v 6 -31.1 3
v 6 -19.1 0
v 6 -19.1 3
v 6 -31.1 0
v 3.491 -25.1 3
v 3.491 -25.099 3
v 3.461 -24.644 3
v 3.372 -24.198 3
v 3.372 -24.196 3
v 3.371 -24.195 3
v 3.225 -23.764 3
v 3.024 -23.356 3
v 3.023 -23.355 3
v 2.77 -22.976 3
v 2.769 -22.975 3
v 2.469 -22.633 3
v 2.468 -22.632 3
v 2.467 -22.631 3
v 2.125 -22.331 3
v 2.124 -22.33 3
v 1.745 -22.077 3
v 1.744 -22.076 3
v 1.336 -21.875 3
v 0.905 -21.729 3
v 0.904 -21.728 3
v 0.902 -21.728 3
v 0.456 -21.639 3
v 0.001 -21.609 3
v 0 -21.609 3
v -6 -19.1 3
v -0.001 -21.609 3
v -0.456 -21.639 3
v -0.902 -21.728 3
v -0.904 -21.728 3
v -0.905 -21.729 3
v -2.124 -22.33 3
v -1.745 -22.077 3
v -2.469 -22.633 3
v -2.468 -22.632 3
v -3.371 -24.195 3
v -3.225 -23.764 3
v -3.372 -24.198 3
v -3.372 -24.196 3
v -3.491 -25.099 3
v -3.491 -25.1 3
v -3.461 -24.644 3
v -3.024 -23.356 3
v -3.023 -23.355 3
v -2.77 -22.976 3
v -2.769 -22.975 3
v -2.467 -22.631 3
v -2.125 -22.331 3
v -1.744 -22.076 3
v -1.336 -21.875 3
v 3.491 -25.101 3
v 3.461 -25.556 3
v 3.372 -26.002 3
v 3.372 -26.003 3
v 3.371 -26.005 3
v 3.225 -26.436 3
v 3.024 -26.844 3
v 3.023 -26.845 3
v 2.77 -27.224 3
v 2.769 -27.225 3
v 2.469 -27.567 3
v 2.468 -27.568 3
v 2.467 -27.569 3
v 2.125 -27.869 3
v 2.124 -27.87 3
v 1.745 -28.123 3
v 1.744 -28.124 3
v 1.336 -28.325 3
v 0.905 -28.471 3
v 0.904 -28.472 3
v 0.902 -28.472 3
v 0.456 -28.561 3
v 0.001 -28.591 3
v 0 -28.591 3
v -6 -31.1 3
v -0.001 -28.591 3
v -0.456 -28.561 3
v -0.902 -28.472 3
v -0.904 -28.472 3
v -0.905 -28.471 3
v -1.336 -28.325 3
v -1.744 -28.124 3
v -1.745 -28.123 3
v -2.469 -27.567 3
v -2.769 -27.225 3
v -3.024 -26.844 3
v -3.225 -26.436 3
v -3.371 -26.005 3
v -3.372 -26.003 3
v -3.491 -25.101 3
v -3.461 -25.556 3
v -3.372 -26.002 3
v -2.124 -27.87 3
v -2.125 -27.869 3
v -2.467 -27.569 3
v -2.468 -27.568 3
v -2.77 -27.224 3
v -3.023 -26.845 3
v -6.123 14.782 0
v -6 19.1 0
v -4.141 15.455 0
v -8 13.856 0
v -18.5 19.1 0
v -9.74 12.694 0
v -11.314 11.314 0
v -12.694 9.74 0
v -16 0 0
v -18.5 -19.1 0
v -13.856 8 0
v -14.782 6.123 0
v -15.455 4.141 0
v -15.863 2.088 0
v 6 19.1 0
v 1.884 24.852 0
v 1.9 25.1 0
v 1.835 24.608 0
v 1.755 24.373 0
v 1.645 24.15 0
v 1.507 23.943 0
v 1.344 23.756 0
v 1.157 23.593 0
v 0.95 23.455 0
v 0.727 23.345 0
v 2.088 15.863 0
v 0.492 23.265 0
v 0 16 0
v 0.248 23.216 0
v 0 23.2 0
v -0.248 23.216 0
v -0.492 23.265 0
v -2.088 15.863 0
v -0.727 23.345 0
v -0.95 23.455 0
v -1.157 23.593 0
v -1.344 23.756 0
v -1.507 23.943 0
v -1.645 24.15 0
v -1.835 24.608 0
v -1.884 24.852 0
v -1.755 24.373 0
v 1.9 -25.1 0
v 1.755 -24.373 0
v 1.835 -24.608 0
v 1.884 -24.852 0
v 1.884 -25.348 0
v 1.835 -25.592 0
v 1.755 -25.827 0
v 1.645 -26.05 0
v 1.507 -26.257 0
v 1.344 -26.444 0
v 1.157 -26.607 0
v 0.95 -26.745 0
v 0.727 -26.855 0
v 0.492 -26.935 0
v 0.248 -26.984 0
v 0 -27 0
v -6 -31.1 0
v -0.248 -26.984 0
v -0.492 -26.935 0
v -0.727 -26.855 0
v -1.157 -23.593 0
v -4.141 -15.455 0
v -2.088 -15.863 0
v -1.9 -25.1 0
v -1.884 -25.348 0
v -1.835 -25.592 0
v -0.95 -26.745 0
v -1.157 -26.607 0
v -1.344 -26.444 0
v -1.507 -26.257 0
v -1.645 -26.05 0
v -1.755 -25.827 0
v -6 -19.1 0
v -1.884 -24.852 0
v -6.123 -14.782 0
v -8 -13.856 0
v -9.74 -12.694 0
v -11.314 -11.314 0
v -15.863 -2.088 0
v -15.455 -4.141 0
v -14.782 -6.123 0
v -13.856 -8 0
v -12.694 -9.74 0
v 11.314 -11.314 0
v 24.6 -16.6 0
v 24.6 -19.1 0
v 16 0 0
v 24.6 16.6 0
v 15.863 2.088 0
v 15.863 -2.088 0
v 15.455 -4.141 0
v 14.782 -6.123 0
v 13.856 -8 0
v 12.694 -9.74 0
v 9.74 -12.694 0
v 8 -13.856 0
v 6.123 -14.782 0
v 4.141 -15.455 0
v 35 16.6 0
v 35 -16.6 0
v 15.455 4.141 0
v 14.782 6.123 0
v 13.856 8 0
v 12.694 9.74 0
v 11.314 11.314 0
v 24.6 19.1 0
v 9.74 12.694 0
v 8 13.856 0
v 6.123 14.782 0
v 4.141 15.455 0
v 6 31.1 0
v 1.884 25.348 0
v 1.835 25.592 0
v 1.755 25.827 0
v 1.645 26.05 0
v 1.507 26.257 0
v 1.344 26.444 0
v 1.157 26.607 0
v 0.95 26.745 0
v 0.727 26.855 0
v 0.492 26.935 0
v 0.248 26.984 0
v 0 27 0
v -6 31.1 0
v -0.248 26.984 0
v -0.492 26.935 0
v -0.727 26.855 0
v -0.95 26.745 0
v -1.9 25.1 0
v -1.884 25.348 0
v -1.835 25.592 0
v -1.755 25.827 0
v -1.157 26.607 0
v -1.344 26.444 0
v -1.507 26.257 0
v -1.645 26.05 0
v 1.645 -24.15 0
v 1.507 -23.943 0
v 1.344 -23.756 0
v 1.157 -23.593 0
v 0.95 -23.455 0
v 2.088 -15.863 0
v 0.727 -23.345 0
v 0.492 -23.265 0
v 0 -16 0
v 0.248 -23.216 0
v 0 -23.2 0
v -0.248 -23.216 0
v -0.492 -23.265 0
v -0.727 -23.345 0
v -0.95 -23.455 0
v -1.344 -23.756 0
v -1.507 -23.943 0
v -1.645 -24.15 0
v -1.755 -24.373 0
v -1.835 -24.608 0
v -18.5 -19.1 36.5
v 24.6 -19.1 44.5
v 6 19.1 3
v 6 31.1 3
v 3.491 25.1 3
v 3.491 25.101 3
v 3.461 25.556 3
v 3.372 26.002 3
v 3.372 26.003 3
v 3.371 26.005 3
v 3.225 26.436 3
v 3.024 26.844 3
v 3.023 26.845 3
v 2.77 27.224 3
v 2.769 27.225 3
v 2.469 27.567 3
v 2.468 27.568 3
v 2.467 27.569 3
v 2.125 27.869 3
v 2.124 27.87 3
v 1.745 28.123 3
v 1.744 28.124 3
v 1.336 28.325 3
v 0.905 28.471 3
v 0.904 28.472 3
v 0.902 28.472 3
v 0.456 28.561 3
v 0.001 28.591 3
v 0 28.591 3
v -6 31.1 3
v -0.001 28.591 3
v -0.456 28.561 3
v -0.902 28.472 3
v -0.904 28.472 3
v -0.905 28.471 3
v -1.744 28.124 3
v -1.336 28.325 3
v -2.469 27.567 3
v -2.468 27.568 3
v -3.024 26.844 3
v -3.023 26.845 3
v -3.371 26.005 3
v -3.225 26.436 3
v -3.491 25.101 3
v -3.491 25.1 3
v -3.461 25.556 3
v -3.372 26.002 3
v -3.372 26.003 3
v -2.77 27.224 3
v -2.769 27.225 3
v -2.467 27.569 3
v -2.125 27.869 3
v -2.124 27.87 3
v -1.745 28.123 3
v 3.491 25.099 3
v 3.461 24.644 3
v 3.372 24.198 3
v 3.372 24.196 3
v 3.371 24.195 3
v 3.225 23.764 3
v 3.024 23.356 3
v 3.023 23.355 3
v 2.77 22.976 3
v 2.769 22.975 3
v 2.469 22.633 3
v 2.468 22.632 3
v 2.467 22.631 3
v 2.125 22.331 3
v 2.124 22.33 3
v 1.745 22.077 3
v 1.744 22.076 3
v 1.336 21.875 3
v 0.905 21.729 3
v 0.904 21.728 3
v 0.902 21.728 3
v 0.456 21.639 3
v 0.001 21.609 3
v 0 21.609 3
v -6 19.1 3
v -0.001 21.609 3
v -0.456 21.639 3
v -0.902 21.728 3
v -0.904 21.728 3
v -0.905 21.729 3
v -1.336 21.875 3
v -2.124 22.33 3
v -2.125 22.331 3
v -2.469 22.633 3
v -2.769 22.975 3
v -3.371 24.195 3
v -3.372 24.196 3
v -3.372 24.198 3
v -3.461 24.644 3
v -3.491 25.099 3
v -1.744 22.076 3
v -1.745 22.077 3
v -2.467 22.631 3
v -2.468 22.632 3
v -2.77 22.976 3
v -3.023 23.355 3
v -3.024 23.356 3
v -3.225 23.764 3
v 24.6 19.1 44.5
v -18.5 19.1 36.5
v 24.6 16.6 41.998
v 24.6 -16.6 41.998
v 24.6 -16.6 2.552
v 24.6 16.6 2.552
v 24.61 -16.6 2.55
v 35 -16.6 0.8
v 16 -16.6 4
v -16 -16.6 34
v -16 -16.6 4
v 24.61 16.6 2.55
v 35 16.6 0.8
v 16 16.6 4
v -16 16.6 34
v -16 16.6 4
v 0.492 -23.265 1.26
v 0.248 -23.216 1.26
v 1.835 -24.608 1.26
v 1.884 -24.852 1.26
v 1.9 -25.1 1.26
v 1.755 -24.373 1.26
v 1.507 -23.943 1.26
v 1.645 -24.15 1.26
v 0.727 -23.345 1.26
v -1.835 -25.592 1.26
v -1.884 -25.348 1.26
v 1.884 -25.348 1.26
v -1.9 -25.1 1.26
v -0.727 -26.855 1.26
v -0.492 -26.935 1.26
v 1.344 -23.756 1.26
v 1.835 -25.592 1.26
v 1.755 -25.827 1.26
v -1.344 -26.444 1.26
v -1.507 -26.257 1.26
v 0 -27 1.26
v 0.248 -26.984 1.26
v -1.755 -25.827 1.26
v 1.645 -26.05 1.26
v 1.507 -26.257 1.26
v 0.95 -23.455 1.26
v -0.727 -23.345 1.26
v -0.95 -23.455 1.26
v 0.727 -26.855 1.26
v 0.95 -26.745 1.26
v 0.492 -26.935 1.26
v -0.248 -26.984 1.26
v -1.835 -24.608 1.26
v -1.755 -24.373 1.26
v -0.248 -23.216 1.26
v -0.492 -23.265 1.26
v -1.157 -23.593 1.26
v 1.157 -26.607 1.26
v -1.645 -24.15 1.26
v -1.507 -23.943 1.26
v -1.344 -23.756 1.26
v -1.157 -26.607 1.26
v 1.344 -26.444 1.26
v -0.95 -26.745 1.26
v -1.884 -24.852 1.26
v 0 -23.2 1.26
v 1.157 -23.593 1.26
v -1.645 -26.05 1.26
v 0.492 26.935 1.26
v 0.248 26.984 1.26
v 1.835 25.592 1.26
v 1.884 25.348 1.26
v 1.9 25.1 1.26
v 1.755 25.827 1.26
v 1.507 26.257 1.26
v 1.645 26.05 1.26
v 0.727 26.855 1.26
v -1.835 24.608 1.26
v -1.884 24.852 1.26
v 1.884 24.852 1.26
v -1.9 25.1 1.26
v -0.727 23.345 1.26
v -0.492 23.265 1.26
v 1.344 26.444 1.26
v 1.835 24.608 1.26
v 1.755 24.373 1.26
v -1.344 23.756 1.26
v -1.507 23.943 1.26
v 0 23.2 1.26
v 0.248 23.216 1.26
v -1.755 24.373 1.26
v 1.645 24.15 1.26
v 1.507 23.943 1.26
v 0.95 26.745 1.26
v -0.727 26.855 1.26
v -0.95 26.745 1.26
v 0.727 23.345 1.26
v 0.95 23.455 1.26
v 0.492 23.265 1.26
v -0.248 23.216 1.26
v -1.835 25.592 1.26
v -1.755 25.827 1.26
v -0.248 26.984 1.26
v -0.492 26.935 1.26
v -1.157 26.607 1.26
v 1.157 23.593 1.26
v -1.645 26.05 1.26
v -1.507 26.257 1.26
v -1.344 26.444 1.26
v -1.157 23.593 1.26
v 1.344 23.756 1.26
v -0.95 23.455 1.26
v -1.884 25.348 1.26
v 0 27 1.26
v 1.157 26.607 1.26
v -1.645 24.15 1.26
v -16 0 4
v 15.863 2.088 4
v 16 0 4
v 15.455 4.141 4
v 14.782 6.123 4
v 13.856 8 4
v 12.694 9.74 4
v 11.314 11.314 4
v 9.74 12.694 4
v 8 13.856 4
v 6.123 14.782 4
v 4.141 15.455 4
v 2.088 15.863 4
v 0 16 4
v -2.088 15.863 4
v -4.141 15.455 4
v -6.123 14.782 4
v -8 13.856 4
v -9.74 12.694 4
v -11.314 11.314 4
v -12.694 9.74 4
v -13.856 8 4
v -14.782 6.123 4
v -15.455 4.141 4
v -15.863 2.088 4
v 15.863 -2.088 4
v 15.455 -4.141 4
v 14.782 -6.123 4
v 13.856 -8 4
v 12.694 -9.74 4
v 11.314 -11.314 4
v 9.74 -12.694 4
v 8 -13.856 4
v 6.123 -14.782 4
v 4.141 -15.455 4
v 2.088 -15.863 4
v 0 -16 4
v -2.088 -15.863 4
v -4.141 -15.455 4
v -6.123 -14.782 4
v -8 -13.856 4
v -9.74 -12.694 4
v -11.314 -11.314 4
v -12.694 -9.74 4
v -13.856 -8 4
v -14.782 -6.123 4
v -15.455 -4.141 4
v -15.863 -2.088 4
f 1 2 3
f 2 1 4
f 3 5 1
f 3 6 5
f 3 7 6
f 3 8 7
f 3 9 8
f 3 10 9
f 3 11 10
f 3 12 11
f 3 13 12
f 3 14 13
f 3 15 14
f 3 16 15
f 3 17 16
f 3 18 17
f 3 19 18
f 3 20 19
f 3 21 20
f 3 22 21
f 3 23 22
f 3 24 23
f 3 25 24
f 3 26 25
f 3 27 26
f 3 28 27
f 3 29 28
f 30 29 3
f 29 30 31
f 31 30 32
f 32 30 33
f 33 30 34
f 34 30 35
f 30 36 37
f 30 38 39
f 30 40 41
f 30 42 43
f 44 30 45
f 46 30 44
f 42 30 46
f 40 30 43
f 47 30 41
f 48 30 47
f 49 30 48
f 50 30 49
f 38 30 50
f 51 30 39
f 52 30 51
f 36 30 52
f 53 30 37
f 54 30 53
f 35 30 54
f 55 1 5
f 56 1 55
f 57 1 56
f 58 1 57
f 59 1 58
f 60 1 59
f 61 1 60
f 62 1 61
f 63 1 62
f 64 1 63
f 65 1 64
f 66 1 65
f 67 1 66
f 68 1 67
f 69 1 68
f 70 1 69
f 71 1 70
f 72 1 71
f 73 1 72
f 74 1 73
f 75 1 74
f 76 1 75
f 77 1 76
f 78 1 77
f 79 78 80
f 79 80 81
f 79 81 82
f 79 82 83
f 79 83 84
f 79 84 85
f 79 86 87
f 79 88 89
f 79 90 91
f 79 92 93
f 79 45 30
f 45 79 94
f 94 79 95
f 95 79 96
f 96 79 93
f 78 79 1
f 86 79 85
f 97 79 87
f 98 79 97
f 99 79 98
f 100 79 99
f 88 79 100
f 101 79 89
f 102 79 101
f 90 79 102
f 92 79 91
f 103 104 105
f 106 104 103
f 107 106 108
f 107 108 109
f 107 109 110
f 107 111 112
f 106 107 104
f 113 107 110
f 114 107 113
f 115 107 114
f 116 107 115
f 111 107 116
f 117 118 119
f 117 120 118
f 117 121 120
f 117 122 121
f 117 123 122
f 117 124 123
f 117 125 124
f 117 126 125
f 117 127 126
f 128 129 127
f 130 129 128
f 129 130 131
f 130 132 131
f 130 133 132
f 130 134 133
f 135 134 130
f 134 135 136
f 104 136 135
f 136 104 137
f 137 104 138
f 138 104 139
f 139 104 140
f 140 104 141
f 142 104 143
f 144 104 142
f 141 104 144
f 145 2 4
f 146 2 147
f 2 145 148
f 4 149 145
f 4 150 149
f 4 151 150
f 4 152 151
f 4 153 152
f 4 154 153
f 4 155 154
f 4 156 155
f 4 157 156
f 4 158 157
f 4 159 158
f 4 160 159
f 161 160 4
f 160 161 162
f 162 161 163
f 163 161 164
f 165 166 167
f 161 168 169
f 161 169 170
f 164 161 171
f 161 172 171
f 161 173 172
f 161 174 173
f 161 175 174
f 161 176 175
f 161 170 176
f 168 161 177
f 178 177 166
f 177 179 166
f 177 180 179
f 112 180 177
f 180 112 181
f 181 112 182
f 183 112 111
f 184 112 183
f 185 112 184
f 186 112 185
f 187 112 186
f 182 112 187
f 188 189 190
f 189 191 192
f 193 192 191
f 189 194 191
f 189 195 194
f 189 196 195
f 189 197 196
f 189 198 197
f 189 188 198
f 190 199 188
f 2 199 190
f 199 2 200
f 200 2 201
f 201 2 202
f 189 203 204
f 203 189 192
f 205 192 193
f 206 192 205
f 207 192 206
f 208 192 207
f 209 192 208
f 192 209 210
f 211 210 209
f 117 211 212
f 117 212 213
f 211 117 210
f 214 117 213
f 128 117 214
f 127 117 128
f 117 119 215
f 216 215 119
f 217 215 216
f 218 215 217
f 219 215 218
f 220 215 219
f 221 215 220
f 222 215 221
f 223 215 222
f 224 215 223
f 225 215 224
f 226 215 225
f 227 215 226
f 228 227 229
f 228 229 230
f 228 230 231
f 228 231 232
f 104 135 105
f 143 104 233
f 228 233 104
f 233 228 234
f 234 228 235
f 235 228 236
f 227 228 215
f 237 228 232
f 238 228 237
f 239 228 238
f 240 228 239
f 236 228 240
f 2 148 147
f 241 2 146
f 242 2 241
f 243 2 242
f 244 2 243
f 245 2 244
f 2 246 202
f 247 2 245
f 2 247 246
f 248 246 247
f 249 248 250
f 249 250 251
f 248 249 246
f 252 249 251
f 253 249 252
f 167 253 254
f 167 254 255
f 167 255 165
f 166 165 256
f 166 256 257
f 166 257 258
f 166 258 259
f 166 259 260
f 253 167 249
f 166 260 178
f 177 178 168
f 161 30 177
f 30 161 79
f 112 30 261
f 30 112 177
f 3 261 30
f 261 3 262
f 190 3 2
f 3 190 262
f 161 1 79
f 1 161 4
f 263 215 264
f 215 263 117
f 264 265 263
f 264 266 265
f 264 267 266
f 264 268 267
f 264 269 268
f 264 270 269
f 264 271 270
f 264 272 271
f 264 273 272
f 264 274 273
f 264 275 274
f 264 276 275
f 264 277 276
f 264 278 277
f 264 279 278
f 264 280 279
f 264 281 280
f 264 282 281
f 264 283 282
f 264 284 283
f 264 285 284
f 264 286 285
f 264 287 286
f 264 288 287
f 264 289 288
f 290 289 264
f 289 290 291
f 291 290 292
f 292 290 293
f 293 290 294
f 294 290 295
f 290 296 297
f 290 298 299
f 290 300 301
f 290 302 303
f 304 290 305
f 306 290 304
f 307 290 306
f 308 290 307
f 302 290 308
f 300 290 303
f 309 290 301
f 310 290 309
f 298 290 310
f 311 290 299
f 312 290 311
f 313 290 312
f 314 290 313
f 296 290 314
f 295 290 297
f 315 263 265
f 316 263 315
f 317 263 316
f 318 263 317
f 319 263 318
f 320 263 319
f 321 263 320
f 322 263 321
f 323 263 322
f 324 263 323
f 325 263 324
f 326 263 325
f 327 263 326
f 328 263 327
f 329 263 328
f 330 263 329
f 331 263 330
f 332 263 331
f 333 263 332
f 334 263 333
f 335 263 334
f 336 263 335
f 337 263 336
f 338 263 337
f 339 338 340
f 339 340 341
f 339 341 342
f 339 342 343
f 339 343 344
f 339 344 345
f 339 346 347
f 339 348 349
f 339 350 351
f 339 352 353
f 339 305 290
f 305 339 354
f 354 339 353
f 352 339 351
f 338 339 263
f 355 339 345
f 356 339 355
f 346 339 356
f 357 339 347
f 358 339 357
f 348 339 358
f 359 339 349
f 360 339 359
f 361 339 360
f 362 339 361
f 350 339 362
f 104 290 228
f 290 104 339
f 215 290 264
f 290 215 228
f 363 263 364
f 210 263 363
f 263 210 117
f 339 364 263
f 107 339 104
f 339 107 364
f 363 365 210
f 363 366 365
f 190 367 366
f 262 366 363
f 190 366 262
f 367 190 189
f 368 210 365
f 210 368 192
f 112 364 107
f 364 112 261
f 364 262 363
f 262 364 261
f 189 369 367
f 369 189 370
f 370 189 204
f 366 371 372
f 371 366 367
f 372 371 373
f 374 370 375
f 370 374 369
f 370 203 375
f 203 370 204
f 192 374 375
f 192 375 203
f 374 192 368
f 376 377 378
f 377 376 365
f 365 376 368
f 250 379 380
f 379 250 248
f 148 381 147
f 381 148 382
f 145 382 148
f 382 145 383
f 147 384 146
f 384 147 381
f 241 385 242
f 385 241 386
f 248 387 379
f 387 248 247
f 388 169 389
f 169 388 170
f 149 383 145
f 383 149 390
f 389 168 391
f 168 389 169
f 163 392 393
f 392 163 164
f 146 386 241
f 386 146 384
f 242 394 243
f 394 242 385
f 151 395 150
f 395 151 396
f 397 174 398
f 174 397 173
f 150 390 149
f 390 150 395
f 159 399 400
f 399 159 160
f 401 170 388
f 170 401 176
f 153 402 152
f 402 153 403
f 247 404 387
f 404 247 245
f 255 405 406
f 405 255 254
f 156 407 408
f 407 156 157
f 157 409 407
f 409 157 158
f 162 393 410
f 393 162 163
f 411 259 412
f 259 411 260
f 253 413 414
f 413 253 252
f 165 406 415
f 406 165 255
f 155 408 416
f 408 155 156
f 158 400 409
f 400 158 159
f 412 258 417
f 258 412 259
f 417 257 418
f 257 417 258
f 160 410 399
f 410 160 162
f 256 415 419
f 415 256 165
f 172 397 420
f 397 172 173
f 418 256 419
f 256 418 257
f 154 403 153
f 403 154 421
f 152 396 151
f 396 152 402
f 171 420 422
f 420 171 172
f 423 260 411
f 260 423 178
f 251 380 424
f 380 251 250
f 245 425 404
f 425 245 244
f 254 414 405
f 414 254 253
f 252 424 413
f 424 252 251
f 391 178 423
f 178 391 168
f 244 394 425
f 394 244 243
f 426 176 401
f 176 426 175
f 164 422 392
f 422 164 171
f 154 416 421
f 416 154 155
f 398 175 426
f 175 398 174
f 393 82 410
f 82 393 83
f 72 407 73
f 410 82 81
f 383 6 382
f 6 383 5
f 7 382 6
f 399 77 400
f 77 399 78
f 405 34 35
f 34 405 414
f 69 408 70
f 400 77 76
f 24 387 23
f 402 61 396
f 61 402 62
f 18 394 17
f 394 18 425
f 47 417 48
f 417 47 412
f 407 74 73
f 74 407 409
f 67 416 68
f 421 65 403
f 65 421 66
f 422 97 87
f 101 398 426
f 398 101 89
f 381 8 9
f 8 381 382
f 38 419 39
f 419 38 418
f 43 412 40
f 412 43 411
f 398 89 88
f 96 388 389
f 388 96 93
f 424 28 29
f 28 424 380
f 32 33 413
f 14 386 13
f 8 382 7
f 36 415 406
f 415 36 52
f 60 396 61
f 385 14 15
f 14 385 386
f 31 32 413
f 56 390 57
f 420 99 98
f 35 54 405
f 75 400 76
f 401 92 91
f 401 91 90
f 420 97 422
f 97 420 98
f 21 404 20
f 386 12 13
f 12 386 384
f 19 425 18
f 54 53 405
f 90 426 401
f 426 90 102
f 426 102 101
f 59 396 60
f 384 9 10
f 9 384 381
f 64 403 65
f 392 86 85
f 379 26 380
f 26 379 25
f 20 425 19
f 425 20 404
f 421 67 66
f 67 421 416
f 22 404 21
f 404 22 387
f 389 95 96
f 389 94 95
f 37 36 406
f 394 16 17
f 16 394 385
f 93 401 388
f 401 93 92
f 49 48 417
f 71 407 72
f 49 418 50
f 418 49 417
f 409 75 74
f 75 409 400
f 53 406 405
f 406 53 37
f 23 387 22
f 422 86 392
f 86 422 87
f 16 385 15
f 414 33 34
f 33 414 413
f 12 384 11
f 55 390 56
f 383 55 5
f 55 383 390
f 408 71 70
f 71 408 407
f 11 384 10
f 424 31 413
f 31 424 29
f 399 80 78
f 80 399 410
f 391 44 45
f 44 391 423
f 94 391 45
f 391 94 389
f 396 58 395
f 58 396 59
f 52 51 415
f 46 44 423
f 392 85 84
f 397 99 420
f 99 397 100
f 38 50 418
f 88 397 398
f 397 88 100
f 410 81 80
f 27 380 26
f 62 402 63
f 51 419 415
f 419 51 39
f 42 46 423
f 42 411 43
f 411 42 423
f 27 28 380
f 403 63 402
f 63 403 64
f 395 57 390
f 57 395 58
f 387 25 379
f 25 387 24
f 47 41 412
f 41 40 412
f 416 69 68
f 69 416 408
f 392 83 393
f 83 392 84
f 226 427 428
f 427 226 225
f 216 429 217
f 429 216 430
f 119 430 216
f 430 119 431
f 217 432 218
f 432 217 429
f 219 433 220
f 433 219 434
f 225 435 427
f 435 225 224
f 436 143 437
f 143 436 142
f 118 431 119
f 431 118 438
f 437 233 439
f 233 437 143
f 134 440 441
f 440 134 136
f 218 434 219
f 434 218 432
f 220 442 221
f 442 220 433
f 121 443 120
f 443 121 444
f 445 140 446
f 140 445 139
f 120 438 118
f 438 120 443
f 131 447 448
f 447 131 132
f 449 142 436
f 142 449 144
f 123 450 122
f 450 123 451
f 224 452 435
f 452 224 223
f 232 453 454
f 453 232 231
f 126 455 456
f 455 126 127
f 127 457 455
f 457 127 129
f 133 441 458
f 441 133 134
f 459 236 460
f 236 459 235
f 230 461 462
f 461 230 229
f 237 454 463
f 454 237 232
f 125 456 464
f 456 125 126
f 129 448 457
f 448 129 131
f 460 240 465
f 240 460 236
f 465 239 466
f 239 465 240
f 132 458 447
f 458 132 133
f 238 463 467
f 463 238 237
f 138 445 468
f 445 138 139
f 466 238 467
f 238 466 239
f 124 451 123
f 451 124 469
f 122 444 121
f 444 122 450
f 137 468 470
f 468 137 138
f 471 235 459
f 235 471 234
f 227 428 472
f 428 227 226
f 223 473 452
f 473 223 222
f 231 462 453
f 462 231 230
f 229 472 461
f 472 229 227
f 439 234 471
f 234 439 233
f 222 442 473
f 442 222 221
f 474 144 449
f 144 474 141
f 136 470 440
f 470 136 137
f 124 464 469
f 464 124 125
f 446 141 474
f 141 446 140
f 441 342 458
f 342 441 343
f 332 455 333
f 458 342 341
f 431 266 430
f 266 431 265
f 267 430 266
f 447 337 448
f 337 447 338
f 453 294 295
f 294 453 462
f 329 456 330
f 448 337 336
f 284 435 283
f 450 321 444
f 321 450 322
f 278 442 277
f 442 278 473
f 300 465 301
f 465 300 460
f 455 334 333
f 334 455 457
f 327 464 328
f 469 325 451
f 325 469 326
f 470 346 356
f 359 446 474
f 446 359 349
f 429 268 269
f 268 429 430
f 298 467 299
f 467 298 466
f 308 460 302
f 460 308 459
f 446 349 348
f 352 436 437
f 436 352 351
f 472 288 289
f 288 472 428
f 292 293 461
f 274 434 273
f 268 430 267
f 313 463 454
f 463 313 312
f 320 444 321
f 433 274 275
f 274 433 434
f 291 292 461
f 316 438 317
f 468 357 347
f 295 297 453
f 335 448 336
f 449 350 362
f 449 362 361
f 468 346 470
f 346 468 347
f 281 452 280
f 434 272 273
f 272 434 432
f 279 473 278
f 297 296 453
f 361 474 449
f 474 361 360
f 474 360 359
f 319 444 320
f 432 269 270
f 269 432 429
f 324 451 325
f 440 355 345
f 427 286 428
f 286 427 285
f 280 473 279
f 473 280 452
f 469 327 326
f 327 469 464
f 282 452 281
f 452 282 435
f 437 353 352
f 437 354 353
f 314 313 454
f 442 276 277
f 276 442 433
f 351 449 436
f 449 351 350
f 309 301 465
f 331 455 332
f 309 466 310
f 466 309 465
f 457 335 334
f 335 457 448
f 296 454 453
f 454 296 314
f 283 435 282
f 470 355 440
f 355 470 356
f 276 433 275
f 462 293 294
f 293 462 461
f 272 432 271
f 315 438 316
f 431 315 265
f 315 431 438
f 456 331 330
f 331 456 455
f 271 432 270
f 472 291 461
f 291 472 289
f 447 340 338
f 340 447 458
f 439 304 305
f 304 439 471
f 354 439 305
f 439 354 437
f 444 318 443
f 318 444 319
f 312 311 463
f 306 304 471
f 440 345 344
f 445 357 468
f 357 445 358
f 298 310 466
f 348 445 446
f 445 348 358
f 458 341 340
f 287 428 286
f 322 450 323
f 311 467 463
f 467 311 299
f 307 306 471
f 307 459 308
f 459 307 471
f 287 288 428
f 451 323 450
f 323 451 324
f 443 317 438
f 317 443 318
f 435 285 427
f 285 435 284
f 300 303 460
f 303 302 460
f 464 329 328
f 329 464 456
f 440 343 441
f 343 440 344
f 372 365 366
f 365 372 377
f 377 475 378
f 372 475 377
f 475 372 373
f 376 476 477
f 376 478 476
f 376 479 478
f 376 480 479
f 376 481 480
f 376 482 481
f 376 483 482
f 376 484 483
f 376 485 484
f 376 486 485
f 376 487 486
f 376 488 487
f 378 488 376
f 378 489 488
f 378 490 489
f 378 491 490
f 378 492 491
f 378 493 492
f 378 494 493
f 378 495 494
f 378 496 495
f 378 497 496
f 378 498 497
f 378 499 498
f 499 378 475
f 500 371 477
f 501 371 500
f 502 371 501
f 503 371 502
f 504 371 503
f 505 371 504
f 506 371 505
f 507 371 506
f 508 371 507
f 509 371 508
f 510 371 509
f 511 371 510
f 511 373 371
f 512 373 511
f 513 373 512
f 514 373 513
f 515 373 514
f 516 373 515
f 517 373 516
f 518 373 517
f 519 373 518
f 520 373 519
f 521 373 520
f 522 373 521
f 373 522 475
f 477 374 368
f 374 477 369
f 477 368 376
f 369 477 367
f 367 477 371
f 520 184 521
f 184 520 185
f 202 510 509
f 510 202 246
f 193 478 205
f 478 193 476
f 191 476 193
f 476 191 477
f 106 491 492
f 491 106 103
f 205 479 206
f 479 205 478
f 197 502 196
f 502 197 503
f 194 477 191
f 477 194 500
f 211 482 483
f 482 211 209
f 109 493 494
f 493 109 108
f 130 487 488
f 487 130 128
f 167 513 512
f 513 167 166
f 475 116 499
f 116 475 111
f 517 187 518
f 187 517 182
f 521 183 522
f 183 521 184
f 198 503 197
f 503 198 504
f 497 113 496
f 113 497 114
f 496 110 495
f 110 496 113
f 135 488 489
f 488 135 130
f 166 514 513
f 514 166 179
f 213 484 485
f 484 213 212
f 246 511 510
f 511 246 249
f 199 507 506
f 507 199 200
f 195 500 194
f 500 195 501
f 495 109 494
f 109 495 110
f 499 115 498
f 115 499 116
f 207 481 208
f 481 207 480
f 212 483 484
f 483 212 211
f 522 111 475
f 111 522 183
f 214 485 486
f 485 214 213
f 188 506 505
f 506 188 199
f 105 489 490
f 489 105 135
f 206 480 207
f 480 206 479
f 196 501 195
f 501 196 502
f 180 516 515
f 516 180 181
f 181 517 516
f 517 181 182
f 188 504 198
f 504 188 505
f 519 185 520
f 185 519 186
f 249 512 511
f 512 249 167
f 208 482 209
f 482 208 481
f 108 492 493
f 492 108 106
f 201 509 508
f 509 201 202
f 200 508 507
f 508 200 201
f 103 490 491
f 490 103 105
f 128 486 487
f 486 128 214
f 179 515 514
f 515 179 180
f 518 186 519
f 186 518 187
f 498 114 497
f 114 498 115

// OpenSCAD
// file: measurements.scad
// Measurements of YOUR table, shared by every printed part, in millimetres.
//
// These are placeholders until the real table is measured with calipers. Edit
// the numbers here (nothing else in this file), save, then open a part and
// export it. See docs/3d-printing.md.
//
// Positions are measured on the underside of the playfield, from its
// BOTTOM-LEFT corner (the corner nearest the player's left hand): x to the
// right, y up the table. The placeholders come from the playfield map and are
// only rough.

// --- The playfield ----------------------------------------------------------

// Thickness of the playfield at the trapdoor holes.
playfield_thickness = 12.7;

// The whole playfield board's width and length (the board runs on under the
// apron, so measure the board itself, not just what's visible).
playfield_width = 520;
playfield_length = 1010;

// --- The trapdoors ----------------------------------------------------------
// "Width" runs across the table (left to right); "length" runs up the table.

// Width of each trapdoor hole.
hole_width = 44;

// Length of each trapdoor hole.
hole_length = 48;

// Distance between the centres of neighbouring holes.
trapdoor_spacing = 50;

// Position of the CENTRE trapdoor hole's centre.
trapdoor_x = 240;
trapdoor_y = 614;

// --- The outhole ------------------------------------------------------------

// Position of the outhole's centre, and its diameter.
outhole_x = 240;
outhole_y = 60;
outhole_diameter = 32;

// --- The shooter lane and ball lift ----------------------------------------
// The ball comes up through a hole in the playfield beside the shooter lane
// (hidden under the apron), and rolls into the lane through an opening in the
// lane's side wall. The opening is assumed to be straight across from the
// hole; if it isn't, say so and the model can be changed.

// Position of the hole the ball is lifted up through, and its diameter.
lift_hole_x = 445;
lift_hole_y = 90;
lift_hole_diameter = 32;

// The shooter lane's side wall, between the hole and the lane: the x of its
// face on the hole's side, and its thickness.
lane_wall_x = 470;
lane_wall_thickness = 10;
// The opening in that wall: its width (along the lane) and height.
lane_opening_width = 34;
lane_opening_height = 32;
// The shooter lane's width, inside.
lane_width = 30;
// Where the plunger's tip is when it's at rest: its y.
plunger_tip_y = 45;
// The space above the playfield over the hole, under the apron (or whatever
// covers it).
lift_headroom = 45;

// The ball-serve (ball lift) coil assembly: the diameter of its plunger, and
// the distance between its two mounting screws.
lift_plunger_diameter = 12.7;
lift_coil_screw_spacing = 40;

// --- Screws and pins ---------------------------------------------------------

// Wood screws into the underside of the playfield. They must be SHORTER than
// the playfield is thick, or they'll come out through the artwork. 3.5 mm x
// 9.5 mm (No. 6 x 3/8") suits a 12.7 mm playfield.
wood_screw_diameter = 3.5;

// Steel rod used as each flap's hinge pin.
hinge_pin_diameter = 2;

// --- Printing ---------------------------------------------------------------

// Gap left between parts that fit together, for a typical printer. Make it
// bigger if parts are too tight, smaller if they're loose.
fit_clearance = 0.4;

// The longest part your printer (or printing service) can print. Long runs are
// split into segments no longer than this.
max_print_length = 170;
// main file
// Ball-lift exit: one. It screws on top of the playfield over the ball lift's
// hole, beside the shooter lane (under the apron). The ball, kicked up through
// the hole, hits the hood's sloping roof, which turns it towards the lane, and
// rolls down the ramp through the opening in the lane's wall. The ramp only
// slopes down into the lane, so a ball rolling back down the lane can't get in.
//
// Print it as it is, flat bottom on the bed, with supports under the roof
// ("supports: on" in the slicer, or ask the printing service).

include <common.scad>

translate([-lift_hole_x, -lift_hole_y, -playfield_thickness]) ball_lift_exit();

module ball_lift_exit() {
    t = playfield_thickness;
    // A shape drawn in the x-z plane (as [x, height above the playfield]
    // points), made `width` wide across y, centred on the hole.
    module profile(points, width) {
        translate([0, lift_hole_y + width / 2, t]) rotate([90, 0, 0])
            linear_extrude(width) polygon(points);
    }
    difference() {
        union() {
            // The hood.
            profile([[hood_back, 0], [hood_front, 0], [hood_front, hood_high + wall], [hood_back, hood_low + wall]],
                2 * (hood_half + wall));
            // The ramp, through the opening in the lane's wall.
            profile([[hood_front - 1, 0], [lane_x, 0], [lane_x, ramp_end], [hood_front - 1, ramp_floor(hood_front - 1)]],
                ramp_width);
            // Screw tabs, one each side.
            for (s = [-1, 1])
                translate([lift_hole_x - 6, lift_hole_y + s * (hood_half + wall + 6) - 6, t]) cube([12, 12, 3]);
        }
        // Inside the hood, open towards the lane.
        profile([[hood_back + wall, ramp_lip], [ramp_start, ramp_lip], [hood_front + 0.01, ramp_floor(hood_front + 0.01)],
                 [hood_front + 0.01, hood_high], [hood_back + wall, hood_low]],
            2 * hood_half);
        // The hole the ball comes up through.
        translate([lift_hole_x, lift_hole_y, t - 1]) cylinder(d = lift_hole_diameter, h = ramp_lip + 2);
        // Wood screws, down into the playfield.
        for (s = [-1, 1])
            translate([lift_hole_x, lift_hole_y + s * (hood_half + wall + 6), t + 3]) mirror([0, 0, 1]) wood_screw_hole(3);
    }
}
